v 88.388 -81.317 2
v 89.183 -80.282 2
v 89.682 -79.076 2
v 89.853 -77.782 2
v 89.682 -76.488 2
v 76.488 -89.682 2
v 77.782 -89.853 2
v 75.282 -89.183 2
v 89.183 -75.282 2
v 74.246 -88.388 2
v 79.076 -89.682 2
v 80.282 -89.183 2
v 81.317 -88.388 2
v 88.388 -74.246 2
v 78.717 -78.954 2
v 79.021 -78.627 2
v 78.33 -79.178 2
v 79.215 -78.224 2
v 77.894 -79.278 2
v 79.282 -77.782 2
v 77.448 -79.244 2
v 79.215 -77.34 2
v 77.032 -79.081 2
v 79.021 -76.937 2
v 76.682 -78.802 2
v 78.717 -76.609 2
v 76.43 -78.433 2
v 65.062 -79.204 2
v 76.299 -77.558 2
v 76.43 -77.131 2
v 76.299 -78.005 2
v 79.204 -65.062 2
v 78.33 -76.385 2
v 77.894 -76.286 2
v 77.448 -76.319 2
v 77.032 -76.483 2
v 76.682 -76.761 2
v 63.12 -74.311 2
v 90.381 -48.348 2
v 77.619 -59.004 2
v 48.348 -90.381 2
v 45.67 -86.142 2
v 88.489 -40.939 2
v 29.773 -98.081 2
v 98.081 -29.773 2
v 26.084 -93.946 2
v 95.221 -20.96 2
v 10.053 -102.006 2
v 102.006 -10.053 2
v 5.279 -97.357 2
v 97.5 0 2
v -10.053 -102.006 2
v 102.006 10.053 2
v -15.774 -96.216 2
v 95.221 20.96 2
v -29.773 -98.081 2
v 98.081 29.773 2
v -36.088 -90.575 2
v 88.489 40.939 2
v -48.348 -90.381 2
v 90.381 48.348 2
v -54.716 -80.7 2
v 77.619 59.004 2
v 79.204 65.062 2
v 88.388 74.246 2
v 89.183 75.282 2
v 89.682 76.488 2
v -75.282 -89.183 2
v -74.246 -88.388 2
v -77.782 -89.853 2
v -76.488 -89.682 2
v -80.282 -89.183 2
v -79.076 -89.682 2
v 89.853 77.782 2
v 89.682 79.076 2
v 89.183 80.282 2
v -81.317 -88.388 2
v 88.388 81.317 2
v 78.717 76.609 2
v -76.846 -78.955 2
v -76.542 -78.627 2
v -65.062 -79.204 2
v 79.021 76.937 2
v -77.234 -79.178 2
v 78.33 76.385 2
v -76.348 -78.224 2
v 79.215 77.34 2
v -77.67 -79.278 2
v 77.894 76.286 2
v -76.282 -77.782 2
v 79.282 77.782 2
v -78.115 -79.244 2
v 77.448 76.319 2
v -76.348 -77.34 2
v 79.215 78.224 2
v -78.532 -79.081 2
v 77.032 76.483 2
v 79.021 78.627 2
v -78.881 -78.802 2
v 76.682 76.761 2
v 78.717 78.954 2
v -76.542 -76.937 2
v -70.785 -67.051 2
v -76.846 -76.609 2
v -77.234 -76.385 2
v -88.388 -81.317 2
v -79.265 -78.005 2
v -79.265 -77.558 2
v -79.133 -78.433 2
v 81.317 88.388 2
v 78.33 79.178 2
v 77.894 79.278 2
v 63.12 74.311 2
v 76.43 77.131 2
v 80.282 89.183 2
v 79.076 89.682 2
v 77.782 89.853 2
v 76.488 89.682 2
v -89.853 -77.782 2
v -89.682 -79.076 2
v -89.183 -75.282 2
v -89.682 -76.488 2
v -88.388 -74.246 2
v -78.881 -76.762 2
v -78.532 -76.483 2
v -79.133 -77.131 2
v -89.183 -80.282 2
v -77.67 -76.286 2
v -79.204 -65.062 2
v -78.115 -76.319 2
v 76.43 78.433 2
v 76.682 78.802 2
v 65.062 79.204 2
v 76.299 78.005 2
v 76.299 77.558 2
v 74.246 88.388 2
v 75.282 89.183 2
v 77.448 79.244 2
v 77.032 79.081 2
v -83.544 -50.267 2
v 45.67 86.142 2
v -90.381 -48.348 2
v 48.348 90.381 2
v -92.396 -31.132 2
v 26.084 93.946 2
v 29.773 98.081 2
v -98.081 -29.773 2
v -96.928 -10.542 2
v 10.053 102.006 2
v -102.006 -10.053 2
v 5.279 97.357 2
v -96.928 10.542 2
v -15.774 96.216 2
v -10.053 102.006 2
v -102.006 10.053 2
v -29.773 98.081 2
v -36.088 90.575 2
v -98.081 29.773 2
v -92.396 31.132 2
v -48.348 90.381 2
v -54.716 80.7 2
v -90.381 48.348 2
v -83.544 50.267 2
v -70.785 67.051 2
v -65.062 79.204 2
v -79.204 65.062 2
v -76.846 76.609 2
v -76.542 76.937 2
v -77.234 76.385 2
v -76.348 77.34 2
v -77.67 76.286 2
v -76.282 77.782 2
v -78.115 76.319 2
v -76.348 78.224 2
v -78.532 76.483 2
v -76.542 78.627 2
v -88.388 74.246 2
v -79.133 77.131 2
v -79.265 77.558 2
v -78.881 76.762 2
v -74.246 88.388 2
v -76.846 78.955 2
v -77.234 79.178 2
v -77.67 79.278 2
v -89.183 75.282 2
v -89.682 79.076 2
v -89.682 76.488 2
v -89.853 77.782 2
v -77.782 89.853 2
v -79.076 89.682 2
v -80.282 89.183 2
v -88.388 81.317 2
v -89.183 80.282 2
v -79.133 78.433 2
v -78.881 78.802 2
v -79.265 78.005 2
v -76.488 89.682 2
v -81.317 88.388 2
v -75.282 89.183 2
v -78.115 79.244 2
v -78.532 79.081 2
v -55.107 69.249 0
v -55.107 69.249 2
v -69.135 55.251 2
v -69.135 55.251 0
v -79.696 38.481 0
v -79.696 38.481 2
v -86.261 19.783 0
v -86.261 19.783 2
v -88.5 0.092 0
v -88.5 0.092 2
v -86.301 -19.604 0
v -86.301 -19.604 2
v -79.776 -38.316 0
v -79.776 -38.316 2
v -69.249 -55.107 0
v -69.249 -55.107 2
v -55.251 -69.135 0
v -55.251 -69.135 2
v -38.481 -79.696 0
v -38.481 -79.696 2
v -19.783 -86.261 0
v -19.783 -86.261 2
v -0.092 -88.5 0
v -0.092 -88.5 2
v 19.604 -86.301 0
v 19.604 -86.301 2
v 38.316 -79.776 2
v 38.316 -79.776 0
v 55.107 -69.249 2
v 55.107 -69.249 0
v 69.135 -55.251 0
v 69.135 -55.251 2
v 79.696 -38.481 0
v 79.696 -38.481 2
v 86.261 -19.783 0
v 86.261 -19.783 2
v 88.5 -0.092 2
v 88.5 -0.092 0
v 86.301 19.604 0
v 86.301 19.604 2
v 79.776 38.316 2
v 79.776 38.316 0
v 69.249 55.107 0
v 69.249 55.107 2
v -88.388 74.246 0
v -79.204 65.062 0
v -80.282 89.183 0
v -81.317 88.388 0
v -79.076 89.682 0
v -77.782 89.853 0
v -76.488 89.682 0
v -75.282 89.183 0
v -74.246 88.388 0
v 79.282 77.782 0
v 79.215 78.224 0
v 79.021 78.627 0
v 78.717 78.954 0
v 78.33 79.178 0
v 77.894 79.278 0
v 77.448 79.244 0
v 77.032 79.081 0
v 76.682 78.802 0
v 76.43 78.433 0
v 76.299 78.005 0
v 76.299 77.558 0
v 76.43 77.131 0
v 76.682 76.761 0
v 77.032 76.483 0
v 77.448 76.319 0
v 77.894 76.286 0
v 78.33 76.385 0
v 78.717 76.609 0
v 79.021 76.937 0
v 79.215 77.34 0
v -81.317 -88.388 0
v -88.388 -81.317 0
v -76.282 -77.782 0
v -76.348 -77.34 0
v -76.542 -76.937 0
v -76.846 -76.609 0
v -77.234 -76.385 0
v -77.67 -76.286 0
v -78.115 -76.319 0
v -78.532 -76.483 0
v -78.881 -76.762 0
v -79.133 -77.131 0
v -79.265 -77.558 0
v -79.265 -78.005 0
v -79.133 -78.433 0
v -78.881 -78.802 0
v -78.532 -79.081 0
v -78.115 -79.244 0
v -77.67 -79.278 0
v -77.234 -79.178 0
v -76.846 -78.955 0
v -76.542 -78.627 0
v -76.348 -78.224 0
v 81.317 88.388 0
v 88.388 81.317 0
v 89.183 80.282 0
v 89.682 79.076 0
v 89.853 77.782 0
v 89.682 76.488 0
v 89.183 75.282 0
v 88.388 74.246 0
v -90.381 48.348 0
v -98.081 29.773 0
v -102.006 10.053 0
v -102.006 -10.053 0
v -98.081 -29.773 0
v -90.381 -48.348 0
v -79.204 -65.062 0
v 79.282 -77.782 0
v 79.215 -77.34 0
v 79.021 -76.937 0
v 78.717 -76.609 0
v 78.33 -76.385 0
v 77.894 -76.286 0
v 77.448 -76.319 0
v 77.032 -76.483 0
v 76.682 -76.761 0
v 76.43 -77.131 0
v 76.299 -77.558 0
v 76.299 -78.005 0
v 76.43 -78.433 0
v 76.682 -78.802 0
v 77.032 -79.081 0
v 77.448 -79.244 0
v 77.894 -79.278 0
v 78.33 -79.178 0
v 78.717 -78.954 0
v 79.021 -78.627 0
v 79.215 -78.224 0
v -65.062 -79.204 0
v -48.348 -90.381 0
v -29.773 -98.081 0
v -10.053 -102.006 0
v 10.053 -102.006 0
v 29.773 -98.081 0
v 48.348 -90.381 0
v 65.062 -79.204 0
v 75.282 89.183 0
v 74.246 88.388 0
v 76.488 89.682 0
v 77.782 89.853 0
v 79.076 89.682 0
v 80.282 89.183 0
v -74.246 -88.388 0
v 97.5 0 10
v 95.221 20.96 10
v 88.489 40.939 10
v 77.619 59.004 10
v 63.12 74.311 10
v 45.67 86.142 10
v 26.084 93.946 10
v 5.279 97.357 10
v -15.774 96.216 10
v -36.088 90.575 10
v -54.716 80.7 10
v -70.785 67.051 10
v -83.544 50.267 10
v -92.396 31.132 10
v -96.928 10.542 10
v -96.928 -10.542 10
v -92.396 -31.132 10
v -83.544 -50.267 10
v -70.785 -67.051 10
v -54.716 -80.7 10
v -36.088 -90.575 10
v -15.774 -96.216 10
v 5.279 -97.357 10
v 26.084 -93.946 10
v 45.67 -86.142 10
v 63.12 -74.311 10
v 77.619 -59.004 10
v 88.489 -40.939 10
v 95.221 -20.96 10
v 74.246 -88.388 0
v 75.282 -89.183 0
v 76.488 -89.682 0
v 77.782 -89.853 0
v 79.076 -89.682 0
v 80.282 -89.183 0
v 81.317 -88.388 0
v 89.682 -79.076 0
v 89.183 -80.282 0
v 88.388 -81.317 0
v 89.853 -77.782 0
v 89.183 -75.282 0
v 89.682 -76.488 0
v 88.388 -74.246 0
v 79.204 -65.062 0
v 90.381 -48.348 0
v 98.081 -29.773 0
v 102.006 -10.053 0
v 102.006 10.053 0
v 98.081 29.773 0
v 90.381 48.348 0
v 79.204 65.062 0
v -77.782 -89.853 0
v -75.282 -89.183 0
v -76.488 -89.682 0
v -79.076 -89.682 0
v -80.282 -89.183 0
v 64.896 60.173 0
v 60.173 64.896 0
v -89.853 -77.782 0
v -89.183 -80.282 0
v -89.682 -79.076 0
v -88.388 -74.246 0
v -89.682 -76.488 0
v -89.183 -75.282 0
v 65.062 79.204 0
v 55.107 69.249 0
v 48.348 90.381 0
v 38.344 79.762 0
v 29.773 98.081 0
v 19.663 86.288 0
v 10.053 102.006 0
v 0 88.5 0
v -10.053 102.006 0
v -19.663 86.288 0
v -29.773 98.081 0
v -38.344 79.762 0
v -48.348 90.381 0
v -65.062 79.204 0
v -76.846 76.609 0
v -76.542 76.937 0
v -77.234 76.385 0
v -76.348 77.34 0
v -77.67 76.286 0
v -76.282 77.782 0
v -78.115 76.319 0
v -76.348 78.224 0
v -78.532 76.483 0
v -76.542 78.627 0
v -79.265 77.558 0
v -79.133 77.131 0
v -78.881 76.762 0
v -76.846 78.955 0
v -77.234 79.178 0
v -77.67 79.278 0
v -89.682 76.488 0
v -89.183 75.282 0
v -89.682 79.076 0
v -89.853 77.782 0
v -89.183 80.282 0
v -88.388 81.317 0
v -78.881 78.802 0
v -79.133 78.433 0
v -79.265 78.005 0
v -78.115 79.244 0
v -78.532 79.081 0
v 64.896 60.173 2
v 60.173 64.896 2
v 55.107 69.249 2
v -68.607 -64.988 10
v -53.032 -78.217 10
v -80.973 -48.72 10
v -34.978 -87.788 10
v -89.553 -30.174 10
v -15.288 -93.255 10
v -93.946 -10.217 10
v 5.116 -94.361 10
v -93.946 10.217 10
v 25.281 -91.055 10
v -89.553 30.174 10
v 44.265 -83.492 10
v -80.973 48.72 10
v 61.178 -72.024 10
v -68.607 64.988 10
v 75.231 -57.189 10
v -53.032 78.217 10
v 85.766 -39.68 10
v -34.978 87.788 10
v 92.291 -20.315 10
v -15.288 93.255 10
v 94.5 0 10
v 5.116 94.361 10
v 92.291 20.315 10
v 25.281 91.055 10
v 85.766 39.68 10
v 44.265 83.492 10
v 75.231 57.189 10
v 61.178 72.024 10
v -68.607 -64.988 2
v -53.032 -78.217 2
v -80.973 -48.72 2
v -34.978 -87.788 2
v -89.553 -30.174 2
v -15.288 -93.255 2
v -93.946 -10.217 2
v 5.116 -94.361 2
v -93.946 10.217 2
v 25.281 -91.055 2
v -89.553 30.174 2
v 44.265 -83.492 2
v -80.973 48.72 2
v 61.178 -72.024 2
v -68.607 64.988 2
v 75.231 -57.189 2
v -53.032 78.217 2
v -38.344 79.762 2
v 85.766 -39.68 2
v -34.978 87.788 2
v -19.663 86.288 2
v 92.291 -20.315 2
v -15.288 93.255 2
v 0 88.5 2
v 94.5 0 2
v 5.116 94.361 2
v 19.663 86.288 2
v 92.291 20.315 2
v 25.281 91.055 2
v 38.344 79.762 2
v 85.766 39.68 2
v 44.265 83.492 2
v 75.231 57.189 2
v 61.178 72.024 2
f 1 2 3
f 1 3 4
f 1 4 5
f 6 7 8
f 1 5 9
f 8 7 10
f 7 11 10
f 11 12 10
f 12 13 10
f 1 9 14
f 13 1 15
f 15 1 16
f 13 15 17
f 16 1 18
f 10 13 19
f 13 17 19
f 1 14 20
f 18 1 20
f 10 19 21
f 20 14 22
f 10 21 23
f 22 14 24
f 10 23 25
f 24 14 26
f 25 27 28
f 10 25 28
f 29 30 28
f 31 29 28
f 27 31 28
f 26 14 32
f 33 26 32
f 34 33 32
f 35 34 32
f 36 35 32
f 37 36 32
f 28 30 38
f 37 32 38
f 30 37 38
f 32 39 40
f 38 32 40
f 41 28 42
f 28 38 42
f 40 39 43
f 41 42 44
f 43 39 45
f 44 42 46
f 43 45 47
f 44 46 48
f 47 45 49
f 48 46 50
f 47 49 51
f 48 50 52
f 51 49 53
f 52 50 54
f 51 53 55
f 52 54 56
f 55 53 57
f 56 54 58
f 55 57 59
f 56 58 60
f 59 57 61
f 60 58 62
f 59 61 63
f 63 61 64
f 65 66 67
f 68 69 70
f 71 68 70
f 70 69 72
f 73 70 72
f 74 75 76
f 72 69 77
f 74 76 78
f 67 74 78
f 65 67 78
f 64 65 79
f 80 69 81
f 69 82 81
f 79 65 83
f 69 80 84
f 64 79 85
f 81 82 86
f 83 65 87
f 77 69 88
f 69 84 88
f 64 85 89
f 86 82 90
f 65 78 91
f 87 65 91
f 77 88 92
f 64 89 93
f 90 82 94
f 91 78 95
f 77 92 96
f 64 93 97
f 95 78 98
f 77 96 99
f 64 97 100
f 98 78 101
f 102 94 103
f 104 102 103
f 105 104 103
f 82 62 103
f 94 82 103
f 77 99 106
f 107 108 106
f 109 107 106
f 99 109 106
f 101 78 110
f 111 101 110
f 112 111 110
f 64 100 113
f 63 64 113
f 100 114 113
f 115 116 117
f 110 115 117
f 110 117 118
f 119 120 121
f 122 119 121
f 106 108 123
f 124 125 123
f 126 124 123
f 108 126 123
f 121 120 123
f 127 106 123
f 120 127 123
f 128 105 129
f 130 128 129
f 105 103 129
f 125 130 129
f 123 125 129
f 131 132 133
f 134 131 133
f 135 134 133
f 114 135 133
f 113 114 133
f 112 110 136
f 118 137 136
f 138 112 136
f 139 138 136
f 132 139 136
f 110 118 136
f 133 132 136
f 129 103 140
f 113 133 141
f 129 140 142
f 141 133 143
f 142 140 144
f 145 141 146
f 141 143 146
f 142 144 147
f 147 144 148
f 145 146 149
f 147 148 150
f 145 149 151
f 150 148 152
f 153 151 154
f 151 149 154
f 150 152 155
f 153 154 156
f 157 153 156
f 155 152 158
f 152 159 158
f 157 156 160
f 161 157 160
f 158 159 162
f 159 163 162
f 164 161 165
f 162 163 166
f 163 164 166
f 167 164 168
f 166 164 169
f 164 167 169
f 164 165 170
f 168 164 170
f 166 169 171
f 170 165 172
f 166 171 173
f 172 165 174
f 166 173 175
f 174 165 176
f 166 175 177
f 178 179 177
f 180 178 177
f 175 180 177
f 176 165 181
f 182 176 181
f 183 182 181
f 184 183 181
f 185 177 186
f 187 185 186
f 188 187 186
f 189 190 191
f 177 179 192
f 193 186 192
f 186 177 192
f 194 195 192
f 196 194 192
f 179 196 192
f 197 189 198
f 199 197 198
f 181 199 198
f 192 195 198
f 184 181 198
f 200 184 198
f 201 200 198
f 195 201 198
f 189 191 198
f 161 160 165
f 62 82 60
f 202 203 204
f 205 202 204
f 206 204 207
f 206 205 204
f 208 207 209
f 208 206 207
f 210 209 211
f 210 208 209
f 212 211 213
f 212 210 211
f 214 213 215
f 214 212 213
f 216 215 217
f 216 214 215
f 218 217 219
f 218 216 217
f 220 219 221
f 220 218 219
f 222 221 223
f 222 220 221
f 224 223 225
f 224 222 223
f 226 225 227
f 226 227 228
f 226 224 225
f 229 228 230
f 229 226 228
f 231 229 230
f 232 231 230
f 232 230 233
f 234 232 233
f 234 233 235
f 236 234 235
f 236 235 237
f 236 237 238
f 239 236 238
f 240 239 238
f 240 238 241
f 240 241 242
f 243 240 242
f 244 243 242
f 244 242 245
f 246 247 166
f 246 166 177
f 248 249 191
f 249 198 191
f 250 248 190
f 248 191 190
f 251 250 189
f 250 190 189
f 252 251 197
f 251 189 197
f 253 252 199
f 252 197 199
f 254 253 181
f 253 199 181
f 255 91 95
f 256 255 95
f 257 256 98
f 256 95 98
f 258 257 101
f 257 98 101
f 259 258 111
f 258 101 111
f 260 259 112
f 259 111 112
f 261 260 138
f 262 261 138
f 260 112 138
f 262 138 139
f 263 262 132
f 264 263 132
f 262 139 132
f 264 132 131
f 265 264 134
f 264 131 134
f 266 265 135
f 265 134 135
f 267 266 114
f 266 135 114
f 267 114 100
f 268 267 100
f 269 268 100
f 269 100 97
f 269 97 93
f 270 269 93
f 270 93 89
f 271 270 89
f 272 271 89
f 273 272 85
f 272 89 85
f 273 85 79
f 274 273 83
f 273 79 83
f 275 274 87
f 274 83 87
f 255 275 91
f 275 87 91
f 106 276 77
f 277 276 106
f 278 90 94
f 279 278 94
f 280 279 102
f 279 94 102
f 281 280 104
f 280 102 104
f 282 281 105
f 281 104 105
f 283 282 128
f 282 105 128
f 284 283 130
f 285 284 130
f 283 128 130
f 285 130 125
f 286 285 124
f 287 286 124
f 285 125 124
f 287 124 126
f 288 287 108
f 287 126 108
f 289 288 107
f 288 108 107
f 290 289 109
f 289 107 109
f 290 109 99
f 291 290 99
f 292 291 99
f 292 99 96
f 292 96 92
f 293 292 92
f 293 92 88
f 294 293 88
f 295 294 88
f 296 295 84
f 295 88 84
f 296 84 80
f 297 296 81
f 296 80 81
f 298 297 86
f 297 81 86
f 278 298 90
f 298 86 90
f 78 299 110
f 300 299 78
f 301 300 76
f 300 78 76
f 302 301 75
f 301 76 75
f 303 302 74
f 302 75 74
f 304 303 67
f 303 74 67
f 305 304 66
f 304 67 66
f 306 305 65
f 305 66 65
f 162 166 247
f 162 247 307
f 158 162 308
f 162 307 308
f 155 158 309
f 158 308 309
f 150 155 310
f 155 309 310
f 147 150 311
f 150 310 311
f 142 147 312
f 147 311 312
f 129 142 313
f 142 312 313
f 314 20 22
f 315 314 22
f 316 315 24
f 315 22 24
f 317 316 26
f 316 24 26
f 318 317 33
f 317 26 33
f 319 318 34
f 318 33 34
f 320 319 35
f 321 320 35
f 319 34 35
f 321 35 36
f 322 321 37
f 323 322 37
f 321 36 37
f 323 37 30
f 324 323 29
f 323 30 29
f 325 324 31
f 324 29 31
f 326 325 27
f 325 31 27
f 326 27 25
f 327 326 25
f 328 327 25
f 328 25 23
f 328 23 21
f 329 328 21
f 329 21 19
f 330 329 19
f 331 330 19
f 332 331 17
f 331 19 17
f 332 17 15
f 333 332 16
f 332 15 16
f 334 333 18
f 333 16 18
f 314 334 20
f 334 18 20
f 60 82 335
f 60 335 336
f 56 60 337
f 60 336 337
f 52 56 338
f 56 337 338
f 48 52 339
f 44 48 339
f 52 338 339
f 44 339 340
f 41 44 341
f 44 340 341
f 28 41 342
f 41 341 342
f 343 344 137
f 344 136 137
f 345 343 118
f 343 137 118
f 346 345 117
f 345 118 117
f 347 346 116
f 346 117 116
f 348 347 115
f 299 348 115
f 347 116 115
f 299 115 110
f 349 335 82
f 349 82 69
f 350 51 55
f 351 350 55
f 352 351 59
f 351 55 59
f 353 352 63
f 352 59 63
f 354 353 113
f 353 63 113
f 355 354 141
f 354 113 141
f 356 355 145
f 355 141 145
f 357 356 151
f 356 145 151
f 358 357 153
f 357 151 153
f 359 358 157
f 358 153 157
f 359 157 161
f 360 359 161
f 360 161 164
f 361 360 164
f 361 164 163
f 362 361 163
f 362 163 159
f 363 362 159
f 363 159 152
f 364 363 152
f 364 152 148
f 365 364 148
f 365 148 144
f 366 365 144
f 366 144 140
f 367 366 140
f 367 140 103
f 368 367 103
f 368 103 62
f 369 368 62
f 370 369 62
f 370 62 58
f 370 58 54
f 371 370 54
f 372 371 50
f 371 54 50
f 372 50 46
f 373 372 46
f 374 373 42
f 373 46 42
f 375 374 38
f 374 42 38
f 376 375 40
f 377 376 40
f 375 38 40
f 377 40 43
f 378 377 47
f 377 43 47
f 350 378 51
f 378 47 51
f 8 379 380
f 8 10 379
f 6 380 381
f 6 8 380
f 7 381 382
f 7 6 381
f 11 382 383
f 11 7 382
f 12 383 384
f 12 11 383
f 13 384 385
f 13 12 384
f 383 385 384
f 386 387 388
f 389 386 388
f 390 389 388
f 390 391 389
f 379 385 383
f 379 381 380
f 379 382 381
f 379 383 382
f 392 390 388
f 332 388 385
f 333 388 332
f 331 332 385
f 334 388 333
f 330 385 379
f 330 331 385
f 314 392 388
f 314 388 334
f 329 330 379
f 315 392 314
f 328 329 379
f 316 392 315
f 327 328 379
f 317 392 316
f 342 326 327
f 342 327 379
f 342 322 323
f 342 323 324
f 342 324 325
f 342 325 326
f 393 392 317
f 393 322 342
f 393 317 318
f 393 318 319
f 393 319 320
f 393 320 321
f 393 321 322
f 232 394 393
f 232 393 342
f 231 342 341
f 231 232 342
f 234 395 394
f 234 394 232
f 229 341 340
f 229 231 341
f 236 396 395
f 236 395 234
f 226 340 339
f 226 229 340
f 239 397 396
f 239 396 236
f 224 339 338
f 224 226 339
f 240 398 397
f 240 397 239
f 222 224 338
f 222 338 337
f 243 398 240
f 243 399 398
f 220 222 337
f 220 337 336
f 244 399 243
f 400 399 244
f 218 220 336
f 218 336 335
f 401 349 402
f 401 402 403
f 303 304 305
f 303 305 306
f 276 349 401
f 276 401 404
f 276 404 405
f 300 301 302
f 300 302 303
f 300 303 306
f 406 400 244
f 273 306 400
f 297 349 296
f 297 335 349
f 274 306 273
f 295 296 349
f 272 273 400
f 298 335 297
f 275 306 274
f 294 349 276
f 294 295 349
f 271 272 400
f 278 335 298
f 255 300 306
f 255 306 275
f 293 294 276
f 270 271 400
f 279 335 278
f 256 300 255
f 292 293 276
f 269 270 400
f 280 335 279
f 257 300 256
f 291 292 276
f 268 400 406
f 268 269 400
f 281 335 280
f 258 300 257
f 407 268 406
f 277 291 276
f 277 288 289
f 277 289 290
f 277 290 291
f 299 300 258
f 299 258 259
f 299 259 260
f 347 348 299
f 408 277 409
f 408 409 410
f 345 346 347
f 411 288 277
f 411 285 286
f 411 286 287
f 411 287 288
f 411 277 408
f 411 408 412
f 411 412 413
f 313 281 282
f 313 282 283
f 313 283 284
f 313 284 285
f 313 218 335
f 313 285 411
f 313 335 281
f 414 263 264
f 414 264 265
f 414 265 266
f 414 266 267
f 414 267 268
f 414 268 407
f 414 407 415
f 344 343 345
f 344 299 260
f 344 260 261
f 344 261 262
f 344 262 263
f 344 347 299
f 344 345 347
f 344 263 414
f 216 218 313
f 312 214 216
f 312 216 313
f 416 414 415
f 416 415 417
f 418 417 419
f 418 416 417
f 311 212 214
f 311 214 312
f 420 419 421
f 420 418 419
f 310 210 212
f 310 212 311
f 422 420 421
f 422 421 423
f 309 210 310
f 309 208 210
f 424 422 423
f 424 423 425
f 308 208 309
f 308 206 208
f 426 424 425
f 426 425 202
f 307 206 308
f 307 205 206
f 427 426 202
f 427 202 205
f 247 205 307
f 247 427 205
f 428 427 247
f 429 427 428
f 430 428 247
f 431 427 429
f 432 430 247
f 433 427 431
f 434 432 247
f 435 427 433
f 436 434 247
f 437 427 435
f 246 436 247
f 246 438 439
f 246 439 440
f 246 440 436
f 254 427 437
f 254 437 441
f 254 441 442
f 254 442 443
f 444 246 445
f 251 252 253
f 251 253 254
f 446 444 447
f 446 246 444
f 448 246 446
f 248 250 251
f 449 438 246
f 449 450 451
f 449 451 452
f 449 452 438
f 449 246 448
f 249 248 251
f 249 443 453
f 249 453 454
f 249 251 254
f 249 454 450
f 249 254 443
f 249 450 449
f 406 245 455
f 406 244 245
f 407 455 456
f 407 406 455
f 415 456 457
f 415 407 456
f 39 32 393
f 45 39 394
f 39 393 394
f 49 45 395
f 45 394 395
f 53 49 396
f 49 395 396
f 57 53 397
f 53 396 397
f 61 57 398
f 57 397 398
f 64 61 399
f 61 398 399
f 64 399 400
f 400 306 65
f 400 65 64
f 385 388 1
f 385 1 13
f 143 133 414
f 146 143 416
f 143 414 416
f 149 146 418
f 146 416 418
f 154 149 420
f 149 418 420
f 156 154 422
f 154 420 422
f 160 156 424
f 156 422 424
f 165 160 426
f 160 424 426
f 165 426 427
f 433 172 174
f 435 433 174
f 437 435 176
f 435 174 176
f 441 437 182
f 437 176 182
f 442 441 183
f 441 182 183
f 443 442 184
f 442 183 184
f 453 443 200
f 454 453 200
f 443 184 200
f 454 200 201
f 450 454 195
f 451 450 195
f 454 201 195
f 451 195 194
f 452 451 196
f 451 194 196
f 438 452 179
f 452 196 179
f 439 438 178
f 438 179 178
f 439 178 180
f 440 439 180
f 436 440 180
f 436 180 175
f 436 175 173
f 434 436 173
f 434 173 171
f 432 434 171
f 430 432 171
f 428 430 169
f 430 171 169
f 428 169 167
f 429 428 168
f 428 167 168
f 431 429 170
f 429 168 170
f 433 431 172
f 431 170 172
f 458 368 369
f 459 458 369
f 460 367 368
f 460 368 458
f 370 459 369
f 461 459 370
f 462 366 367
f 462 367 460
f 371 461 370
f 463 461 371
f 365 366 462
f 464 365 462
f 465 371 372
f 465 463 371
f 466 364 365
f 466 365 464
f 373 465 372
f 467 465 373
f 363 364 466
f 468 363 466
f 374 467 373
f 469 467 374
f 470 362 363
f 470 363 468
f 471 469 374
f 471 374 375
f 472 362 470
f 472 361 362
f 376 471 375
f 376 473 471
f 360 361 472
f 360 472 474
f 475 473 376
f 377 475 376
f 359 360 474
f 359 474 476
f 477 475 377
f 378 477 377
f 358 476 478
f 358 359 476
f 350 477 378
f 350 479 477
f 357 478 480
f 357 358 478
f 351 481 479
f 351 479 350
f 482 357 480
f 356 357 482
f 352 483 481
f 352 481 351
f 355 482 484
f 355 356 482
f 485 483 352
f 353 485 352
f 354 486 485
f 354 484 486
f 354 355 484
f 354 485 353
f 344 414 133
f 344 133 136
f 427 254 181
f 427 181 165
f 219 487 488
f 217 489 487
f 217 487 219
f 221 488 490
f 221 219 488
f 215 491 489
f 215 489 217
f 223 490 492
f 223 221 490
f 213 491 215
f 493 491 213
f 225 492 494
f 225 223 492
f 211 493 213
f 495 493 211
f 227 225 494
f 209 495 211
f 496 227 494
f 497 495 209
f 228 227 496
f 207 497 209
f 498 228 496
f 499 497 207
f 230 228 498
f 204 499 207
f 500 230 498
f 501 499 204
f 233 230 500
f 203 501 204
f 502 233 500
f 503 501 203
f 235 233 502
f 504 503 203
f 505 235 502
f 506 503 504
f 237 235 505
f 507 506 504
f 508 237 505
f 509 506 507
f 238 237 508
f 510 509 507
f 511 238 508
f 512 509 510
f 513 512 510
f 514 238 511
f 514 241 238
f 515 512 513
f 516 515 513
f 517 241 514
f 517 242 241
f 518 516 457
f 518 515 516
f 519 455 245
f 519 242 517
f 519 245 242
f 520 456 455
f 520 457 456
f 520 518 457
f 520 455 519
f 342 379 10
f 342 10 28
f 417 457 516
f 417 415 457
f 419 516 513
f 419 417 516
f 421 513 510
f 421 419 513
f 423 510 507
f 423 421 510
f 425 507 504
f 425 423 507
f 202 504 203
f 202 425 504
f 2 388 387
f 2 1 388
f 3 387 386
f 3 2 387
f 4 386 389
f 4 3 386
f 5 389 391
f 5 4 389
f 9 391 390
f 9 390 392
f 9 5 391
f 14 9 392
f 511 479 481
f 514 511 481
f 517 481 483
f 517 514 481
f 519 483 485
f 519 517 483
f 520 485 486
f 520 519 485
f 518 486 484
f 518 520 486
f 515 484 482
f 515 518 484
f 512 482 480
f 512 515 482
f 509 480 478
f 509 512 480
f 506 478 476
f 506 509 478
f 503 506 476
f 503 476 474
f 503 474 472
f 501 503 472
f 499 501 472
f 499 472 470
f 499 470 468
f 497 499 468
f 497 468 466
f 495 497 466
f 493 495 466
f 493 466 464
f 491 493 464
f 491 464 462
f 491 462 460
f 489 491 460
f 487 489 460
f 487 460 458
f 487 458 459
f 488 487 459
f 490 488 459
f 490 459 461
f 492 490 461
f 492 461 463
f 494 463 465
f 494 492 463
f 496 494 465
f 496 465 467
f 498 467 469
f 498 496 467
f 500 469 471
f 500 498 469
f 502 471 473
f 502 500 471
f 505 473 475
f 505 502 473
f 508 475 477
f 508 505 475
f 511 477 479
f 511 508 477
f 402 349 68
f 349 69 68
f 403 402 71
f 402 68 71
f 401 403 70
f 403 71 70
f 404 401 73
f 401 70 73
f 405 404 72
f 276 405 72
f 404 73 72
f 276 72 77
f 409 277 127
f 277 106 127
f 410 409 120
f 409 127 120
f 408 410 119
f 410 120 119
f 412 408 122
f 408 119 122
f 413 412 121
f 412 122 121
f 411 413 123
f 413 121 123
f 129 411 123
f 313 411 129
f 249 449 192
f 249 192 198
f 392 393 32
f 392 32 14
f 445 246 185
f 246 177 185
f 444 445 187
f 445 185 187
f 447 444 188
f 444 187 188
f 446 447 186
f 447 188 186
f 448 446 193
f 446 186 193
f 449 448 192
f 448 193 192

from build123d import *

# Parameters (mm, degrees)
SKETCH_R        = 102.5
SKETCH_R_2      = 88.5
PAD_DEPTH       = 2
SKETCH001_R     = 97.5
SKETCH001_R_2   = 94.5
PAD001_DEPTH    = 8
PAD002_DEPTH    = 2
PAD003_DEPTH    = 2
SKETCH004_R     = 1.5
POCKET_DEPTH    = 2
SKETCH005_R     = 88.5
POCKET001_DEPTH = 2
FILLET_R        = 5
FILLET001_R     = 5
FILLET002_R     = 5
FILLET003_R     = 5


with BuildPart() as part:
    # Sketch → Pad (new body)
    with BuildSketch(Plane.XY):
        Circle(SKETCH_R)
        Circle(SKETCH_R_2, mode=Mode.SUBTRACT)
    extrude(amount=PAD_DEPTH)

    # Sketch001 (on Face4 of Pad) → Pad001 (join)
    with BuildSketch(Plane.XY.offset(2)):
        Circle(SKETCH001_R)
        Circle(SKETCH001_R_2, mode=Mode.SUBTRACT)
    extrude(amount=PAD001_DEPTH)

    # Sketch002 → Pad002 (join)
    with BuildSketch(Plane.XY):
        Polygon((-91.923836, 77.781784), (-77.781703, 91.923922), (91.923897, -77.781733), (77.781764, -91.923871), align=None)
    extrude(amount=PAD002_DEPTH)

    # Sketch003 → Pad003 (join)
    with BuildSketch(Plane.XY):
        Polygon((77.781763, 91.923871), (91.923897, 77.781733), (-77.781703, -91.923922), (-91.923836, -77.781784), align=None)
    extrude(amount=PAD003_DEPTH)

    # Sketch004 (on Face30 of Pad003) → Pocket (cut)
    with BuildSketch(Plane.XY.offset(2)):
        with Locations((77.781762, -77.781734)):
            Circle(SKETCH004_R)
        with Locations((-77.781701, -77.781785)):
            Circle(SKETCH004_R)
        with Locations((-77.781701, 77.781785)):
            Circle(SKETCH004_R)
        with Locations((77.781762, 77.781734)):
            Circle(SKETCH004_R)
    extrude(amount=-POCKET_DEPTH, mode=Mode.SUBTRACT)

    # Sketch005 (on Face36 of Pocket) → Pocket001 (cut)
    with BuildSketch(Plane.XY.offset(2)):
        Circle(SKETCH005_R)
    extrude(amount=-POCKET001_DEPTH, mode=Mode.SUBTRACT)

    # Fillet
    fillet_edges = [part.edges().sort_by_distance(p)[0] for p in [
        (91.923897, -77.781733, 1),
        (77.781764, -91.923871, 1),
    ]]
    fillet(fillet_edges, radius=FILLET_R)

    # Fillet001
    fillet001_edges = [part.edges().sort_by_distance(p)[0] for p in [
        (-77.781703, -91.923922, 1),
    ]]
    fillet(fillet001_edges, radius=FILLET001_R)

    # Fillet002
    fillet002_edges = [part.edges().sort_by_distance(p)[0] for p in [
        (-91.923836, -77.781784, 1),
    ]]
    fillet(fillet002_edges, radius=FILLET002_R)

    # Fillet003
    fillet003_edges = [part.edges().sort_by_distance(p)[0] for p in [
        (91.923897, 77.781733, 1),
        (77.781763, 91.923871, 1),
        (-77.781703, 91.923922, 1),
        (-91.923836, 77.781784, 1),
    ]]
    fillet(fillet003_edges, radius=FILLET003_R)


solid = part.part
